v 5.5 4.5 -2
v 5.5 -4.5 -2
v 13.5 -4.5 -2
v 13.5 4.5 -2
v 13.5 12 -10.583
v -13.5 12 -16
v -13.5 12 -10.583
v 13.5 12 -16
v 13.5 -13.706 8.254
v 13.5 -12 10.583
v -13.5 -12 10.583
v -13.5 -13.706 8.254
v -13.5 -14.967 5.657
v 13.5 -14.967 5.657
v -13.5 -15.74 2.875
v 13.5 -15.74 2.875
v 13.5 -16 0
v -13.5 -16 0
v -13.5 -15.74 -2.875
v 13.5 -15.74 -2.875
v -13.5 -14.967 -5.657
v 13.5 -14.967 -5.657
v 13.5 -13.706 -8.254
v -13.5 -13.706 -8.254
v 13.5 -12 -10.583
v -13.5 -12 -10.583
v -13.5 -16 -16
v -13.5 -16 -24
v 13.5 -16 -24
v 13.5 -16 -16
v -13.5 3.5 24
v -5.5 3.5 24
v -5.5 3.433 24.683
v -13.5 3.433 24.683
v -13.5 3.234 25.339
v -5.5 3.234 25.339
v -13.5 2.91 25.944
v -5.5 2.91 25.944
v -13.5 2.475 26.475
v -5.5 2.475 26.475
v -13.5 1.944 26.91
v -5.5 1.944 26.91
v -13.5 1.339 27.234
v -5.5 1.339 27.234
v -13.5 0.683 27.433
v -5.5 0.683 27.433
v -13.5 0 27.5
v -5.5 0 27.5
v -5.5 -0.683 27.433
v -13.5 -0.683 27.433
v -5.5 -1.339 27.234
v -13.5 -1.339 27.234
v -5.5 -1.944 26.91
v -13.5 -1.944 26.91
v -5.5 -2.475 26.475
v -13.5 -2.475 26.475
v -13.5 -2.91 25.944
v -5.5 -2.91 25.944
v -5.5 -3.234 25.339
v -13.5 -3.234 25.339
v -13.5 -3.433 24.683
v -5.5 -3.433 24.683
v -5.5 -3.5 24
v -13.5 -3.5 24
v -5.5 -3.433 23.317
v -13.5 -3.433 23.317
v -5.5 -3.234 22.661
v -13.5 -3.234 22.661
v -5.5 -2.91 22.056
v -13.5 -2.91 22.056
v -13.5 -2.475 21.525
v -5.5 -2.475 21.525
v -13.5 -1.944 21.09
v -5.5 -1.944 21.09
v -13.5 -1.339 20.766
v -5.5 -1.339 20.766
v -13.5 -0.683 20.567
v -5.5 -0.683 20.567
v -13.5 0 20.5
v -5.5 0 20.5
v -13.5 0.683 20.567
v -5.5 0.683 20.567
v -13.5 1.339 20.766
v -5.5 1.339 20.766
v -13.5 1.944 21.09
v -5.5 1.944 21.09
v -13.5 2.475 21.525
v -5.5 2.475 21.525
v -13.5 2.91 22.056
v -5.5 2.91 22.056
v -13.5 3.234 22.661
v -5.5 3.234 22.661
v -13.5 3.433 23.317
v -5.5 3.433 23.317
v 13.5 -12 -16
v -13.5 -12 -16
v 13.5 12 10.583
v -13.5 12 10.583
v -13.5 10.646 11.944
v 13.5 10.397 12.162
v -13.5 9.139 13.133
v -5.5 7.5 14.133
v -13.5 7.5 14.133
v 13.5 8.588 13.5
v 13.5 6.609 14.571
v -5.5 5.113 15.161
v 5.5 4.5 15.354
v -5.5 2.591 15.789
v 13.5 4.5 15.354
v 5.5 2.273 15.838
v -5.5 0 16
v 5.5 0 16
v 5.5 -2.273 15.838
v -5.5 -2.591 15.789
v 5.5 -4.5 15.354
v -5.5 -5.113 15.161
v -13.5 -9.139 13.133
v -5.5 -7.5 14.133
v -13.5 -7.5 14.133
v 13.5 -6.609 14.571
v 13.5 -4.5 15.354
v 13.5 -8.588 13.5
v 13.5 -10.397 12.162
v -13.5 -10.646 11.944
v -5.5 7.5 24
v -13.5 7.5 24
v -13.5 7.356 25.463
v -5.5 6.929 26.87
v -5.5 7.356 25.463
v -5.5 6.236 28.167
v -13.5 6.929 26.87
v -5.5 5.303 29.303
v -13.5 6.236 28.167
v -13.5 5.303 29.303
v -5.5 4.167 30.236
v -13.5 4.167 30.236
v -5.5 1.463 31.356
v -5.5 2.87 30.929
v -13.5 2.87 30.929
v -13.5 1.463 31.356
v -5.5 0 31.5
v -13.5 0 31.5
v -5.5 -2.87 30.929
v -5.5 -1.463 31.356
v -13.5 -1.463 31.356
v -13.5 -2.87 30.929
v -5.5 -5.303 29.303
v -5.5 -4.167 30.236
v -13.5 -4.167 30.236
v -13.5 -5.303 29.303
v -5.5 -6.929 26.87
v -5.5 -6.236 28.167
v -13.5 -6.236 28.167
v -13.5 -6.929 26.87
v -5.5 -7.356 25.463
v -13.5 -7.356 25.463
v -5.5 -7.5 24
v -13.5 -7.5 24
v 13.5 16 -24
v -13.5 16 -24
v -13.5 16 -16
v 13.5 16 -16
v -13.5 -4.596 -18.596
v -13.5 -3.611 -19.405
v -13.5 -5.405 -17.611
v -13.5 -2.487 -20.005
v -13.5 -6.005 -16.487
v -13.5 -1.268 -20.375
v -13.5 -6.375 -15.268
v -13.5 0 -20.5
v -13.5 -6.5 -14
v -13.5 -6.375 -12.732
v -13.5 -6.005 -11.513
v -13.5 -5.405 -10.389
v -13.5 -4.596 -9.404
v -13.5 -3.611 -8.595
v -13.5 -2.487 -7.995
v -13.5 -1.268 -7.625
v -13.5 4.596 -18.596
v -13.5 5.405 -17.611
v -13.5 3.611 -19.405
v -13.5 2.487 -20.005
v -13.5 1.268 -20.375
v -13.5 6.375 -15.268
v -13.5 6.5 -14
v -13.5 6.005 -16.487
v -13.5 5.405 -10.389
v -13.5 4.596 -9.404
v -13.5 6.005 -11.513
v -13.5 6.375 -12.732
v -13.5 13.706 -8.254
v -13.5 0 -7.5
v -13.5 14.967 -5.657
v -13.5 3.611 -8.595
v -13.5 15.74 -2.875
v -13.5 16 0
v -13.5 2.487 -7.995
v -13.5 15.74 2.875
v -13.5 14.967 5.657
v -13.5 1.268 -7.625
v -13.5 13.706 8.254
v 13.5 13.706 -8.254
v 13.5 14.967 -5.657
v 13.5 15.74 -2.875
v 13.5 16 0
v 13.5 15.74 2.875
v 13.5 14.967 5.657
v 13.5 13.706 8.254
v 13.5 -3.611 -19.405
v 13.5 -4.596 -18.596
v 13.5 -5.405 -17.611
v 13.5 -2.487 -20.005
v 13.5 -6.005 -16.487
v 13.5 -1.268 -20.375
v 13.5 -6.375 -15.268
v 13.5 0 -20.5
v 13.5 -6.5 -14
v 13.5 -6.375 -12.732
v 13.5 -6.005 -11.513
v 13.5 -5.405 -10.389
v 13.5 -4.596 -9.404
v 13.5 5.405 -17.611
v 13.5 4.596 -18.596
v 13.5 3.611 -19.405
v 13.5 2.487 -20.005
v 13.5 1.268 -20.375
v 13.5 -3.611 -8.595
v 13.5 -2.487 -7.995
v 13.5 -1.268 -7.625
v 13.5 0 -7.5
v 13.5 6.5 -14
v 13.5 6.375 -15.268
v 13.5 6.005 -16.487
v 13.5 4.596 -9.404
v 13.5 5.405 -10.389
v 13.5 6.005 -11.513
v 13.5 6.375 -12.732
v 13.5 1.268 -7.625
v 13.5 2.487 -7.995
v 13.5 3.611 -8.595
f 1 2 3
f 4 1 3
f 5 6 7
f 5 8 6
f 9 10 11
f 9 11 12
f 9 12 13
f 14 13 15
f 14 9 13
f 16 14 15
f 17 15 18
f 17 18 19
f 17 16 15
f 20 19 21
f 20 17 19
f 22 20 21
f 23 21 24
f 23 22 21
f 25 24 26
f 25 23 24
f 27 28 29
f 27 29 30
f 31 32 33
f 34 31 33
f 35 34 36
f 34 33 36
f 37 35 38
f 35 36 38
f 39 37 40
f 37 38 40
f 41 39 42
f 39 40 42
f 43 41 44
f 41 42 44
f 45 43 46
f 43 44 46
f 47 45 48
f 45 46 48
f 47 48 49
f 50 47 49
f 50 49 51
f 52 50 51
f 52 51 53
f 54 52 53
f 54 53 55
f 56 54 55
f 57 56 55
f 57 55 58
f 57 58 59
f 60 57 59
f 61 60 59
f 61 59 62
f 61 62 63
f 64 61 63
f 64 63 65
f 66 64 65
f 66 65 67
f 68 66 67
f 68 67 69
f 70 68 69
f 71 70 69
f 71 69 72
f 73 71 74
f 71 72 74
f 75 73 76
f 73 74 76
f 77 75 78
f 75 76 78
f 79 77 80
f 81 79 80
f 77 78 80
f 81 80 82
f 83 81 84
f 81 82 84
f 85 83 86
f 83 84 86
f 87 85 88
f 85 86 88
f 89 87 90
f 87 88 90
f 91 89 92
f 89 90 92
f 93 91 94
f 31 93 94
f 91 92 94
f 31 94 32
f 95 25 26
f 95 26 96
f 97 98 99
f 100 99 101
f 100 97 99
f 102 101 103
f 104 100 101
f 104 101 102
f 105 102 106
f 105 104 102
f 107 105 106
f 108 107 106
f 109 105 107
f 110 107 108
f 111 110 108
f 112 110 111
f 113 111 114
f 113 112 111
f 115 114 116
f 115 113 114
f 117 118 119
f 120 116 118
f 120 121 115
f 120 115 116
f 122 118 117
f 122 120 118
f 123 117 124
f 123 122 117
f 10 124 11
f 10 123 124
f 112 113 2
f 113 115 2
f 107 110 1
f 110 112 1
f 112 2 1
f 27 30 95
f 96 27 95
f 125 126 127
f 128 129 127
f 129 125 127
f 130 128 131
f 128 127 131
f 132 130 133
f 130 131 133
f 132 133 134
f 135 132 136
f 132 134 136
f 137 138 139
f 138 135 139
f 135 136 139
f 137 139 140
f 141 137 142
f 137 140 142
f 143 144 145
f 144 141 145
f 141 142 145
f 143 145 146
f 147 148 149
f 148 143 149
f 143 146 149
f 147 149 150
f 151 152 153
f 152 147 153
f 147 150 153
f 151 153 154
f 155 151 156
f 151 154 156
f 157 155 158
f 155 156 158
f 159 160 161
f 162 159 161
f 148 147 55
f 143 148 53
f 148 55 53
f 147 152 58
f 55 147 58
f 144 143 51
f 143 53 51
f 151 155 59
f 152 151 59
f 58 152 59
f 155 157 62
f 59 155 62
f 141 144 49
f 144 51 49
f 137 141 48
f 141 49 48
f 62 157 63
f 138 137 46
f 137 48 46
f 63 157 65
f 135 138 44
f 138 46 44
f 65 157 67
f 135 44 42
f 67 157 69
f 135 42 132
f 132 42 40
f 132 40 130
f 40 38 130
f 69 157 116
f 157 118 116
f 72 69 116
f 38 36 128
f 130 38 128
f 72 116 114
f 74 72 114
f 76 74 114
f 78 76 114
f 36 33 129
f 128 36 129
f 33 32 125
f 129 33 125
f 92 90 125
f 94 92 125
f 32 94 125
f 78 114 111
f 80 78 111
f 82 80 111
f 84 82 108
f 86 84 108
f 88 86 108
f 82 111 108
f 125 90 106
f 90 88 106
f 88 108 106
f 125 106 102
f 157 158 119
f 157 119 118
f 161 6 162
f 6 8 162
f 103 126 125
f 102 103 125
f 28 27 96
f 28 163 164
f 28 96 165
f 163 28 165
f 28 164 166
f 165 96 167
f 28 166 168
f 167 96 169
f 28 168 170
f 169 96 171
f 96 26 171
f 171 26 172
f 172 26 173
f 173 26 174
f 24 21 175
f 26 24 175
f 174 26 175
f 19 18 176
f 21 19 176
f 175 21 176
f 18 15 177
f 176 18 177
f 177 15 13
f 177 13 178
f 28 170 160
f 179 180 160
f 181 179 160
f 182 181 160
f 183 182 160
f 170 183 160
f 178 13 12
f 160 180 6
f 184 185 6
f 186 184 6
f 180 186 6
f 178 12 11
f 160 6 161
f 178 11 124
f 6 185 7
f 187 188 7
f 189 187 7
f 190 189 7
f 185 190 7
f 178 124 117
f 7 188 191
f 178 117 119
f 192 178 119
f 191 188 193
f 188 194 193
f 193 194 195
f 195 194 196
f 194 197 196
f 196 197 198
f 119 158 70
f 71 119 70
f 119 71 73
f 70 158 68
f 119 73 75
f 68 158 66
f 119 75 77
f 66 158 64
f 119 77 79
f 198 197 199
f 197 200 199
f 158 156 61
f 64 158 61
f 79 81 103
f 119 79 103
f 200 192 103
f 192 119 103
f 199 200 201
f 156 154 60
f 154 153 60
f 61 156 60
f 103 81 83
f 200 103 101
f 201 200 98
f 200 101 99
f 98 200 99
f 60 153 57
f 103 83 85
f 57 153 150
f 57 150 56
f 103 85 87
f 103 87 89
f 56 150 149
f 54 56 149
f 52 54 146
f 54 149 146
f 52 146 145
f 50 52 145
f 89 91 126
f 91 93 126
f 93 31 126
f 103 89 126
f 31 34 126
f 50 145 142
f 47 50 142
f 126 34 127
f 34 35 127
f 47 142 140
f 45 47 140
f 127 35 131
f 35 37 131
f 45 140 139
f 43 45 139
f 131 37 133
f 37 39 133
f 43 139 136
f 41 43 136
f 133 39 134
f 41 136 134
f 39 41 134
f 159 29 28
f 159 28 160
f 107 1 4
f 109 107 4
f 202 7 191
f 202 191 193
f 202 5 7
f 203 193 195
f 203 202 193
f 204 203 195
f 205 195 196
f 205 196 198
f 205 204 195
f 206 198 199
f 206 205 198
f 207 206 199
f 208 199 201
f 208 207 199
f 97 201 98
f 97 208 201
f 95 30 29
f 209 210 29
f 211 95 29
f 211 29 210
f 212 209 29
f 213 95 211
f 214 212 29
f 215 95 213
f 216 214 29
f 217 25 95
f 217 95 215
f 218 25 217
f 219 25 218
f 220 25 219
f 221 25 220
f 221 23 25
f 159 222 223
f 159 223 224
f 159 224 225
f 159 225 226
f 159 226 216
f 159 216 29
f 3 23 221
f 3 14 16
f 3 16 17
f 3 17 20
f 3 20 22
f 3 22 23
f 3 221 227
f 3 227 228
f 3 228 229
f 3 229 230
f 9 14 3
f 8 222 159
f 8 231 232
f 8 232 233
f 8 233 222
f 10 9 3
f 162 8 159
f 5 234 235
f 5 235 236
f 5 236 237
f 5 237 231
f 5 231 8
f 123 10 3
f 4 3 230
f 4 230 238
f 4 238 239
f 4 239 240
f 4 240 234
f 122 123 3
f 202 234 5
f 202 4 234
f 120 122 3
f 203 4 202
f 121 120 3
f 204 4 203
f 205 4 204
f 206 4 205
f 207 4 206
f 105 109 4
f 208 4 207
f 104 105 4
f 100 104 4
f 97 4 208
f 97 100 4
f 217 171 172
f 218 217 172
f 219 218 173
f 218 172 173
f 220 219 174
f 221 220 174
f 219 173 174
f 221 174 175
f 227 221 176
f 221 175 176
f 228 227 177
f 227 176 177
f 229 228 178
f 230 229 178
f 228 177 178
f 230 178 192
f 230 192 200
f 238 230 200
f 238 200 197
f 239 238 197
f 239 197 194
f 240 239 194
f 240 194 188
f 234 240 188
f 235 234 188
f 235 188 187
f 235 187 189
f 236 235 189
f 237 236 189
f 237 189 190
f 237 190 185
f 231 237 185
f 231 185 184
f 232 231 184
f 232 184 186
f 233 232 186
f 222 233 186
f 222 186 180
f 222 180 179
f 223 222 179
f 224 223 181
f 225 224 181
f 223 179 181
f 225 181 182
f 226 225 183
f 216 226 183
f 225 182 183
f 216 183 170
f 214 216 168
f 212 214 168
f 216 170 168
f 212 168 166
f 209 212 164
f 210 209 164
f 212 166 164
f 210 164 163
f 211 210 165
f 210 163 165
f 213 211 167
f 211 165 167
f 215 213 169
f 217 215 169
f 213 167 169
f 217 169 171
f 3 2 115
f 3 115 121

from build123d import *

# Parameters (mm, degrees)
F0_W          = 4
F0_H          = 8
F1_DEPTH      = 13.5
F3_D          = 13
F4_W          = 8
F4_H          = 9
F4_H_2        = 3
F5_DEPTH      = 31.5
F6_DEPTH      = 110
F6_DEPTH_BACK = 2
F8_D          = 7
F9_DEPTH      = 25


with BuildPart() as f1:
    # F0 (on Right) → F1 (new body, symmetric)
    with BuildSketch(Plane.YZ):
        with BuildLine():
            Line((12, 0), (12, 10.5830052443))
            ThreePointArc((12, 10.5830052443), (0, 16), (-12, 10.5830052443))
            Line((-12, 10.5830052443), (-12, 0))
            Line((-12, 0), (12, 0))
        make_face()
        with BuildLine():
            Line((12, 0), (16, 0))
            ThreePointArc((16, 0), (14.9666295471, 5.6568542495), (12, 10.5830052443))
            Line((12, 10.5830052443), (12, 0))
        make_face()
        with BuildLine():
            Line((12, -10.5830052443), (12, 0))
            Line((12, 0), (-12, 0))
            Line((-12, 0), (-12, -10.5830052443))
            ThreePointArc((-12, -10.5830052443), (-6.5830052443, -14.5830052443), (0, -16))
            ThreePointArc((0, -16), (6.5830052443, -14.5830052443), (12, -10.5830052443))
        make_face()
        with BuildLine():
            ThreePointArc((12, -10.5830052443), (14.9666295471, -5.6568542495), (16, 0))
            Line((16, 0), (12, 0))
            Line((12, 0), (12, -10.5830052443))
        make_face()
        with BuildLine():
            Line((-12, 0), (-12, 10.5830052443))
            ThreePointArc((-12, 10.5830052443), (-14.9666295471, 5.6568542495), (-16, 0))
            Line((-16, 0), (-12, 0))
        make_face()
        with BuildLine():
            Line((-12, -10.5830052443), (-12, 0))
            Line((-12, 0), (-16, 0))
            ThreePointArc((-16, 0), (-14.9666295471, -5.6568542495), (-12, -10.5830052443))
        make_face()
        with BuildLine():
            Line((-12, -16), (0, -16))
            ThreePointArc((0, -16), (-6.5830052443, -14.5830052443), (-12, -10.5830052443))
            Line((-12, -10.5830052443), (-12, -16))
        make_face()
        Polygon((12, -24), (12, -16), (0, -16), (-12, -16), (-12, -24), align=None)
        with Locations((-14, -20)):
            Rectangle(F0_W, F0_H)
        with BuildLine():
            Line((12, -16), (12, -10.5830052443))
            ThreePointArc((12, -10.5830052443), (6.5830052443, -14.5830052443), (0, -16))
            Line((0, -16), (12, -16))
        make_face()
        with Locations((14, -20)):
            Rectangle(F0_W, F0_H)
    extrude(amount=F1_DEPTH, both=True)

    # F3 (through all)
    with Locations(Plane.YZ.offset(13.5)):
        with Locations((0, -14)):
            Hole(F3_D / 2)

    # F4 (on Top) → F5 (join)
    with BuildSketch(Plane.XY):
        with Locations((-9.5, 0)):
            Rectangle(F4_W, F4_H)
        with Locations((-9.5, 6)):
            Rectangle(F4_W, F4_H_2)
        with Locations((-9.5, -6)):
            Rectangle(F4_W, F4_H_2)
    extrude(amount=F5_DEPTH)

    # F4 (on Top) → F6 (cut, two sides)
    with BuildSketch(Plane.XY) as f6_sk:
        with Locations((9.5, 0)):
            Rectangle(F4_W, F4_H)
    extrude(amount=F6_DEPTH, mode=Mode.SUBTRACT)
    extrude(f6_sk.sketch, amount=-F6_DEPTH_BACK, mode=Mode.SUBTRACT)

    # F8 (through all)
    with Locations(Plane(origin=(-13.5, 0, 0), x_dir=(0, -1, 0), z_dir=(-1, 0, 0))):
        with Locations((0, 24)):
            Hole(F8_D / 2)

    # F7 (on face) → F9 (cut)
    with BuildSketch(Plane(origin=(-13.5, 0, 0), x_dir=(0, -1, 0), z_dir=(-1, 0, 0))):
        with BuildLine():
            Line((7.5, 24), (7.5, 31.5))
            Line((7.5, 31.5), (0, 31.5))
            ThreePointArc((0, 31.5), (5.3033008589, 29.3033008589), (7.5, 24))
        make_face()
        with BuildLine():
            ThreePointArc((-7.5, 24), (-5.3033008589, 29.3033008589), (0, 31.5))
            Line((0, 31.5), (-7.5, 31.5))
            Line((-7.5, 31.5), (-7.5, 24))
        make_face()
    extrude(amount=-F9_DEPTH, mode=Mode.SUBTRACT)


solid = f1.part
